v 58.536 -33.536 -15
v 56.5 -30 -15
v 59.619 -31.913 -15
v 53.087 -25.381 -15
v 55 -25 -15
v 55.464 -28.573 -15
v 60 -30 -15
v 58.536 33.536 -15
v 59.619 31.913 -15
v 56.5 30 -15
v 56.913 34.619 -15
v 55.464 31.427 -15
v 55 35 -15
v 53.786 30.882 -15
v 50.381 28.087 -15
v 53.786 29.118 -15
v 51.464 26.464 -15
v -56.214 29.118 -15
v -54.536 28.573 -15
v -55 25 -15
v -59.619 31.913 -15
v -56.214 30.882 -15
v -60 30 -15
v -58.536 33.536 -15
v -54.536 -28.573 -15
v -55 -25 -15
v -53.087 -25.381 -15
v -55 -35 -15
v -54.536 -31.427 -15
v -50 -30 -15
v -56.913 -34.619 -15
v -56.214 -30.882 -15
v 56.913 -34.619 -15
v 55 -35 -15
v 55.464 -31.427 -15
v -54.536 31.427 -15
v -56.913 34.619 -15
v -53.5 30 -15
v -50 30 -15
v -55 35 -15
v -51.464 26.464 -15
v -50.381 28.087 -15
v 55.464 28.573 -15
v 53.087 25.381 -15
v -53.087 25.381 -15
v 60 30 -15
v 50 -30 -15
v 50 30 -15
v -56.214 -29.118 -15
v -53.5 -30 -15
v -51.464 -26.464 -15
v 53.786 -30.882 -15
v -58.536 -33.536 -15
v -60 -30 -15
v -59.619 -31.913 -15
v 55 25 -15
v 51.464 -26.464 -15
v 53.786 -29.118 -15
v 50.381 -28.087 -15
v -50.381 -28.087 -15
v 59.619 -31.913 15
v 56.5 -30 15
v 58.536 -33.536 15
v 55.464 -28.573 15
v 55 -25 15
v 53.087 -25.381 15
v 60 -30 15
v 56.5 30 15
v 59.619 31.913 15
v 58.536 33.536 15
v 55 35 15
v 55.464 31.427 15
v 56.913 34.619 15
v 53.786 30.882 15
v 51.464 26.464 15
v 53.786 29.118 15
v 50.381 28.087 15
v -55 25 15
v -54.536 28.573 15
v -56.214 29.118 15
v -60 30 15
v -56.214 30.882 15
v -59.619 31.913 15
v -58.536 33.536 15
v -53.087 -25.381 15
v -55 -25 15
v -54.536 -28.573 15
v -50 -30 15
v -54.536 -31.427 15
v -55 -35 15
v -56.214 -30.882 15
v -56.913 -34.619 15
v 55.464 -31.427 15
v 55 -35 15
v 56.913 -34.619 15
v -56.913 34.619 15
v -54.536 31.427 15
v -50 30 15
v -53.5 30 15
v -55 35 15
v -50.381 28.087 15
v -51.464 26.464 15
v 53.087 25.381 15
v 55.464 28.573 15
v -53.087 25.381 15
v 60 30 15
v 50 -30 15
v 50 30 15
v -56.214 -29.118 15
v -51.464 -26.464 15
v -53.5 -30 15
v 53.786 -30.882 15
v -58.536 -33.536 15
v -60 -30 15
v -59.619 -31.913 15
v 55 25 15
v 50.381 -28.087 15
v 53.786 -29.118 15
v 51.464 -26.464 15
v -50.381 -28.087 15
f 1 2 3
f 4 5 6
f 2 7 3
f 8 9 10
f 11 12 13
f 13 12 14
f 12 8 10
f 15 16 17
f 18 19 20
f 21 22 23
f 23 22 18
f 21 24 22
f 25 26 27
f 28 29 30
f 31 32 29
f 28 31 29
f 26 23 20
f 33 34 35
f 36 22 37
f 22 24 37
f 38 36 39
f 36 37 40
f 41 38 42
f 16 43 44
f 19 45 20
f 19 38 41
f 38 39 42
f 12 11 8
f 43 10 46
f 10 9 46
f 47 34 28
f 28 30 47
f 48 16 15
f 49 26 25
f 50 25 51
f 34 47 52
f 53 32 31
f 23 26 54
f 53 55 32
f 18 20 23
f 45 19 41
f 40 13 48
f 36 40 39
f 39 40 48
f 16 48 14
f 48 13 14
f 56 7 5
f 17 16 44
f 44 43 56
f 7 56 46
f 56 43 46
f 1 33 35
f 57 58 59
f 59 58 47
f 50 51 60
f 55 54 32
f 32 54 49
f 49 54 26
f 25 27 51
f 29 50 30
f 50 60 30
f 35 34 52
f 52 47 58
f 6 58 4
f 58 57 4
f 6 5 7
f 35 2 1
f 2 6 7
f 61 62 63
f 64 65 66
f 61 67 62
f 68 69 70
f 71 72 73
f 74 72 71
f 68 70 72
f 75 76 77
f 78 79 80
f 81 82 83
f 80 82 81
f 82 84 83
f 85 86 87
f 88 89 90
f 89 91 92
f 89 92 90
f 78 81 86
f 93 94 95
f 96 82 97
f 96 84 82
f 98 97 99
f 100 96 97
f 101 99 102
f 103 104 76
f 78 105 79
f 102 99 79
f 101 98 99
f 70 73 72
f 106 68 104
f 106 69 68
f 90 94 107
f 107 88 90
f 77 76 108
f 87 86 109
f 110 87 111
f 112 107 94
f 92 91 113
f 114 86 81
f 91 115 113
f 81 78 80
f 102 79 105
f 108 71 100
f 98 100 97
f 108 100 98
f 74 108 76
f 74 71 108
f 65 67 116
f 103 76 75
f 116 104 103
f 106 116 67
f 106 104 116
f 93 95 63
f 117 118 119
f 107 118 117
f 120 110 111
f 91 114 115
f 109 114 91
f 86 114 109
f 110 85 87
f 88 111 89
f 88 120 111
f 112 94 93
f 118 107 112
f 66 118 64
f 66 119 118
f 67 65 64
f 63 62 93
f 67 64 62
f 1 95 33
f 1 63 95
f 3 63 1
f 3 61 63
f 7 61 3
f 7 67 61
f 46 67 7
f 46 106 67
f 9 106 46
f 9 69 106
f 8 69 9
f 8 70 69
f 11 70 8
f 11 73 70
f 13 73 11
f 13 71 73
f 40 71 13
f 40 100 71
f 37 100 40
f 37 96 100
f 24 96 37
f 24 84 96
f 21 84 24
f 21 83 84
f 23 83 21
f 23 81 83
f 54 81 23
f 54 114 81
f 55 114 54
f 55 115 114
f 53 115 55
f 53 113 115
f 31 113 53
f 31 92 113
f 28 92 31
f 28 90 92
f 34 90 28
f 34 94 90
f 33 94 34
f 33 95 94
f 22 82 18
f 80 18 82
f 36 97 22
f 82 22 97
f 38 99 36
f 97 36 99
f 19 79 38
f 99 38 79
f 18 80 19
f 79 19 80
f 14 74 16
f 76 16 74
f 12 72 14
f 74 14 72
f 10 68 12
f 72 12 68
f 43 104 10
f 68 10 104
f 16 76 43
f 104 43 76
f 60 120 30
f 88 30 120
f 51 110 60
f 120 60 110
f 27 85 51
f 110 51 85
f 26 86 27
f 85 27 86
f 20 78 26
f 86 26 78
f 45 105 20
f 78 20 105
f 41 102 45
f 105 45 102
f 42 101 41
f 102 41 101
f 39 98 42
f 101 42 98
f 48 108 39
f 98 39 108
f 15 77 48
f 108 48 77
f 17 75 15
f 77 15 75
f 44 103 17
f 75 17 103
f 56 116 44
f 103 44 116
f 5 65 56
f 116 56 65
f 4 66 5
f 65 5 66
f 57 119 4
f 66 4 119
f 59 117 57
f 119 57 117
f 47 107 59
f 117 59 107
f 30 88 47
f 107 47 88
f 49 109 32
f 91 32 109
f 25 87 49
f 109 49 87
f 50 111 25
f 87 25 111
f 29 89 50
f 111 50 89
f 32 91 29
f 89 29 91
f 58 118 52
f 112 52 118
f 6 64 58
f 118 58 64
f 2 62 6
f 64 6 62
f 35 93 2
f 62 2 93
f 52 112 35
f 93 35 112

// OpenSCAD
// file: ../common.scad
inner_size = [110, 60];
outer_size = inner_size + [10, 10];
centre_section_depth = 30;

corner_radius = 5;

sheet_thickness = 3;

magic_1 = outer_size - [2*corner_radius, 2*corner_radius];

module PlaceAtCentres(c)
{
  d = c / 2;
  for(x = [-d[0], d[0]])
  {
    for(y = [-d[1], d[1]])
    {
      translate([x, y])
      {
        children();
      }
    }
  }
}

module PanelProjectionOuter()
{
  minkowski()
  {
    square(magic_1, center=true);
    circle(r=corner_radius);
  }
}

module AssemblyHolesProjection(d)
{
  PlaceAtCentres(magic_1)
  {
    circle(d=d, $fn=32);
  }
}

module PanelProjection()
{

  difference()
  {
    PanelProjectionOuter();
    AssemblyHolesProjection(3.1);
  }
}
// main file
include <../common.scad>

module Enclosure()
{
  linear_extrude(centre_section_depth, center=true)
  {
    difference()
    {
      union()
      {
        difference()
        {
          PanelProjectionOuter();
          square(inner_size, center=true);
        }

        /* Assembly screw hole support */
        PlaceAtCentres(magic_1)
        {
          circle(d=10);
        }
      }

      /* Assembly screw holes */
      PlaceAtCentres(magic_1)
      {
        circle(d=3);
      }
    }
  }
}

Enclosure();
